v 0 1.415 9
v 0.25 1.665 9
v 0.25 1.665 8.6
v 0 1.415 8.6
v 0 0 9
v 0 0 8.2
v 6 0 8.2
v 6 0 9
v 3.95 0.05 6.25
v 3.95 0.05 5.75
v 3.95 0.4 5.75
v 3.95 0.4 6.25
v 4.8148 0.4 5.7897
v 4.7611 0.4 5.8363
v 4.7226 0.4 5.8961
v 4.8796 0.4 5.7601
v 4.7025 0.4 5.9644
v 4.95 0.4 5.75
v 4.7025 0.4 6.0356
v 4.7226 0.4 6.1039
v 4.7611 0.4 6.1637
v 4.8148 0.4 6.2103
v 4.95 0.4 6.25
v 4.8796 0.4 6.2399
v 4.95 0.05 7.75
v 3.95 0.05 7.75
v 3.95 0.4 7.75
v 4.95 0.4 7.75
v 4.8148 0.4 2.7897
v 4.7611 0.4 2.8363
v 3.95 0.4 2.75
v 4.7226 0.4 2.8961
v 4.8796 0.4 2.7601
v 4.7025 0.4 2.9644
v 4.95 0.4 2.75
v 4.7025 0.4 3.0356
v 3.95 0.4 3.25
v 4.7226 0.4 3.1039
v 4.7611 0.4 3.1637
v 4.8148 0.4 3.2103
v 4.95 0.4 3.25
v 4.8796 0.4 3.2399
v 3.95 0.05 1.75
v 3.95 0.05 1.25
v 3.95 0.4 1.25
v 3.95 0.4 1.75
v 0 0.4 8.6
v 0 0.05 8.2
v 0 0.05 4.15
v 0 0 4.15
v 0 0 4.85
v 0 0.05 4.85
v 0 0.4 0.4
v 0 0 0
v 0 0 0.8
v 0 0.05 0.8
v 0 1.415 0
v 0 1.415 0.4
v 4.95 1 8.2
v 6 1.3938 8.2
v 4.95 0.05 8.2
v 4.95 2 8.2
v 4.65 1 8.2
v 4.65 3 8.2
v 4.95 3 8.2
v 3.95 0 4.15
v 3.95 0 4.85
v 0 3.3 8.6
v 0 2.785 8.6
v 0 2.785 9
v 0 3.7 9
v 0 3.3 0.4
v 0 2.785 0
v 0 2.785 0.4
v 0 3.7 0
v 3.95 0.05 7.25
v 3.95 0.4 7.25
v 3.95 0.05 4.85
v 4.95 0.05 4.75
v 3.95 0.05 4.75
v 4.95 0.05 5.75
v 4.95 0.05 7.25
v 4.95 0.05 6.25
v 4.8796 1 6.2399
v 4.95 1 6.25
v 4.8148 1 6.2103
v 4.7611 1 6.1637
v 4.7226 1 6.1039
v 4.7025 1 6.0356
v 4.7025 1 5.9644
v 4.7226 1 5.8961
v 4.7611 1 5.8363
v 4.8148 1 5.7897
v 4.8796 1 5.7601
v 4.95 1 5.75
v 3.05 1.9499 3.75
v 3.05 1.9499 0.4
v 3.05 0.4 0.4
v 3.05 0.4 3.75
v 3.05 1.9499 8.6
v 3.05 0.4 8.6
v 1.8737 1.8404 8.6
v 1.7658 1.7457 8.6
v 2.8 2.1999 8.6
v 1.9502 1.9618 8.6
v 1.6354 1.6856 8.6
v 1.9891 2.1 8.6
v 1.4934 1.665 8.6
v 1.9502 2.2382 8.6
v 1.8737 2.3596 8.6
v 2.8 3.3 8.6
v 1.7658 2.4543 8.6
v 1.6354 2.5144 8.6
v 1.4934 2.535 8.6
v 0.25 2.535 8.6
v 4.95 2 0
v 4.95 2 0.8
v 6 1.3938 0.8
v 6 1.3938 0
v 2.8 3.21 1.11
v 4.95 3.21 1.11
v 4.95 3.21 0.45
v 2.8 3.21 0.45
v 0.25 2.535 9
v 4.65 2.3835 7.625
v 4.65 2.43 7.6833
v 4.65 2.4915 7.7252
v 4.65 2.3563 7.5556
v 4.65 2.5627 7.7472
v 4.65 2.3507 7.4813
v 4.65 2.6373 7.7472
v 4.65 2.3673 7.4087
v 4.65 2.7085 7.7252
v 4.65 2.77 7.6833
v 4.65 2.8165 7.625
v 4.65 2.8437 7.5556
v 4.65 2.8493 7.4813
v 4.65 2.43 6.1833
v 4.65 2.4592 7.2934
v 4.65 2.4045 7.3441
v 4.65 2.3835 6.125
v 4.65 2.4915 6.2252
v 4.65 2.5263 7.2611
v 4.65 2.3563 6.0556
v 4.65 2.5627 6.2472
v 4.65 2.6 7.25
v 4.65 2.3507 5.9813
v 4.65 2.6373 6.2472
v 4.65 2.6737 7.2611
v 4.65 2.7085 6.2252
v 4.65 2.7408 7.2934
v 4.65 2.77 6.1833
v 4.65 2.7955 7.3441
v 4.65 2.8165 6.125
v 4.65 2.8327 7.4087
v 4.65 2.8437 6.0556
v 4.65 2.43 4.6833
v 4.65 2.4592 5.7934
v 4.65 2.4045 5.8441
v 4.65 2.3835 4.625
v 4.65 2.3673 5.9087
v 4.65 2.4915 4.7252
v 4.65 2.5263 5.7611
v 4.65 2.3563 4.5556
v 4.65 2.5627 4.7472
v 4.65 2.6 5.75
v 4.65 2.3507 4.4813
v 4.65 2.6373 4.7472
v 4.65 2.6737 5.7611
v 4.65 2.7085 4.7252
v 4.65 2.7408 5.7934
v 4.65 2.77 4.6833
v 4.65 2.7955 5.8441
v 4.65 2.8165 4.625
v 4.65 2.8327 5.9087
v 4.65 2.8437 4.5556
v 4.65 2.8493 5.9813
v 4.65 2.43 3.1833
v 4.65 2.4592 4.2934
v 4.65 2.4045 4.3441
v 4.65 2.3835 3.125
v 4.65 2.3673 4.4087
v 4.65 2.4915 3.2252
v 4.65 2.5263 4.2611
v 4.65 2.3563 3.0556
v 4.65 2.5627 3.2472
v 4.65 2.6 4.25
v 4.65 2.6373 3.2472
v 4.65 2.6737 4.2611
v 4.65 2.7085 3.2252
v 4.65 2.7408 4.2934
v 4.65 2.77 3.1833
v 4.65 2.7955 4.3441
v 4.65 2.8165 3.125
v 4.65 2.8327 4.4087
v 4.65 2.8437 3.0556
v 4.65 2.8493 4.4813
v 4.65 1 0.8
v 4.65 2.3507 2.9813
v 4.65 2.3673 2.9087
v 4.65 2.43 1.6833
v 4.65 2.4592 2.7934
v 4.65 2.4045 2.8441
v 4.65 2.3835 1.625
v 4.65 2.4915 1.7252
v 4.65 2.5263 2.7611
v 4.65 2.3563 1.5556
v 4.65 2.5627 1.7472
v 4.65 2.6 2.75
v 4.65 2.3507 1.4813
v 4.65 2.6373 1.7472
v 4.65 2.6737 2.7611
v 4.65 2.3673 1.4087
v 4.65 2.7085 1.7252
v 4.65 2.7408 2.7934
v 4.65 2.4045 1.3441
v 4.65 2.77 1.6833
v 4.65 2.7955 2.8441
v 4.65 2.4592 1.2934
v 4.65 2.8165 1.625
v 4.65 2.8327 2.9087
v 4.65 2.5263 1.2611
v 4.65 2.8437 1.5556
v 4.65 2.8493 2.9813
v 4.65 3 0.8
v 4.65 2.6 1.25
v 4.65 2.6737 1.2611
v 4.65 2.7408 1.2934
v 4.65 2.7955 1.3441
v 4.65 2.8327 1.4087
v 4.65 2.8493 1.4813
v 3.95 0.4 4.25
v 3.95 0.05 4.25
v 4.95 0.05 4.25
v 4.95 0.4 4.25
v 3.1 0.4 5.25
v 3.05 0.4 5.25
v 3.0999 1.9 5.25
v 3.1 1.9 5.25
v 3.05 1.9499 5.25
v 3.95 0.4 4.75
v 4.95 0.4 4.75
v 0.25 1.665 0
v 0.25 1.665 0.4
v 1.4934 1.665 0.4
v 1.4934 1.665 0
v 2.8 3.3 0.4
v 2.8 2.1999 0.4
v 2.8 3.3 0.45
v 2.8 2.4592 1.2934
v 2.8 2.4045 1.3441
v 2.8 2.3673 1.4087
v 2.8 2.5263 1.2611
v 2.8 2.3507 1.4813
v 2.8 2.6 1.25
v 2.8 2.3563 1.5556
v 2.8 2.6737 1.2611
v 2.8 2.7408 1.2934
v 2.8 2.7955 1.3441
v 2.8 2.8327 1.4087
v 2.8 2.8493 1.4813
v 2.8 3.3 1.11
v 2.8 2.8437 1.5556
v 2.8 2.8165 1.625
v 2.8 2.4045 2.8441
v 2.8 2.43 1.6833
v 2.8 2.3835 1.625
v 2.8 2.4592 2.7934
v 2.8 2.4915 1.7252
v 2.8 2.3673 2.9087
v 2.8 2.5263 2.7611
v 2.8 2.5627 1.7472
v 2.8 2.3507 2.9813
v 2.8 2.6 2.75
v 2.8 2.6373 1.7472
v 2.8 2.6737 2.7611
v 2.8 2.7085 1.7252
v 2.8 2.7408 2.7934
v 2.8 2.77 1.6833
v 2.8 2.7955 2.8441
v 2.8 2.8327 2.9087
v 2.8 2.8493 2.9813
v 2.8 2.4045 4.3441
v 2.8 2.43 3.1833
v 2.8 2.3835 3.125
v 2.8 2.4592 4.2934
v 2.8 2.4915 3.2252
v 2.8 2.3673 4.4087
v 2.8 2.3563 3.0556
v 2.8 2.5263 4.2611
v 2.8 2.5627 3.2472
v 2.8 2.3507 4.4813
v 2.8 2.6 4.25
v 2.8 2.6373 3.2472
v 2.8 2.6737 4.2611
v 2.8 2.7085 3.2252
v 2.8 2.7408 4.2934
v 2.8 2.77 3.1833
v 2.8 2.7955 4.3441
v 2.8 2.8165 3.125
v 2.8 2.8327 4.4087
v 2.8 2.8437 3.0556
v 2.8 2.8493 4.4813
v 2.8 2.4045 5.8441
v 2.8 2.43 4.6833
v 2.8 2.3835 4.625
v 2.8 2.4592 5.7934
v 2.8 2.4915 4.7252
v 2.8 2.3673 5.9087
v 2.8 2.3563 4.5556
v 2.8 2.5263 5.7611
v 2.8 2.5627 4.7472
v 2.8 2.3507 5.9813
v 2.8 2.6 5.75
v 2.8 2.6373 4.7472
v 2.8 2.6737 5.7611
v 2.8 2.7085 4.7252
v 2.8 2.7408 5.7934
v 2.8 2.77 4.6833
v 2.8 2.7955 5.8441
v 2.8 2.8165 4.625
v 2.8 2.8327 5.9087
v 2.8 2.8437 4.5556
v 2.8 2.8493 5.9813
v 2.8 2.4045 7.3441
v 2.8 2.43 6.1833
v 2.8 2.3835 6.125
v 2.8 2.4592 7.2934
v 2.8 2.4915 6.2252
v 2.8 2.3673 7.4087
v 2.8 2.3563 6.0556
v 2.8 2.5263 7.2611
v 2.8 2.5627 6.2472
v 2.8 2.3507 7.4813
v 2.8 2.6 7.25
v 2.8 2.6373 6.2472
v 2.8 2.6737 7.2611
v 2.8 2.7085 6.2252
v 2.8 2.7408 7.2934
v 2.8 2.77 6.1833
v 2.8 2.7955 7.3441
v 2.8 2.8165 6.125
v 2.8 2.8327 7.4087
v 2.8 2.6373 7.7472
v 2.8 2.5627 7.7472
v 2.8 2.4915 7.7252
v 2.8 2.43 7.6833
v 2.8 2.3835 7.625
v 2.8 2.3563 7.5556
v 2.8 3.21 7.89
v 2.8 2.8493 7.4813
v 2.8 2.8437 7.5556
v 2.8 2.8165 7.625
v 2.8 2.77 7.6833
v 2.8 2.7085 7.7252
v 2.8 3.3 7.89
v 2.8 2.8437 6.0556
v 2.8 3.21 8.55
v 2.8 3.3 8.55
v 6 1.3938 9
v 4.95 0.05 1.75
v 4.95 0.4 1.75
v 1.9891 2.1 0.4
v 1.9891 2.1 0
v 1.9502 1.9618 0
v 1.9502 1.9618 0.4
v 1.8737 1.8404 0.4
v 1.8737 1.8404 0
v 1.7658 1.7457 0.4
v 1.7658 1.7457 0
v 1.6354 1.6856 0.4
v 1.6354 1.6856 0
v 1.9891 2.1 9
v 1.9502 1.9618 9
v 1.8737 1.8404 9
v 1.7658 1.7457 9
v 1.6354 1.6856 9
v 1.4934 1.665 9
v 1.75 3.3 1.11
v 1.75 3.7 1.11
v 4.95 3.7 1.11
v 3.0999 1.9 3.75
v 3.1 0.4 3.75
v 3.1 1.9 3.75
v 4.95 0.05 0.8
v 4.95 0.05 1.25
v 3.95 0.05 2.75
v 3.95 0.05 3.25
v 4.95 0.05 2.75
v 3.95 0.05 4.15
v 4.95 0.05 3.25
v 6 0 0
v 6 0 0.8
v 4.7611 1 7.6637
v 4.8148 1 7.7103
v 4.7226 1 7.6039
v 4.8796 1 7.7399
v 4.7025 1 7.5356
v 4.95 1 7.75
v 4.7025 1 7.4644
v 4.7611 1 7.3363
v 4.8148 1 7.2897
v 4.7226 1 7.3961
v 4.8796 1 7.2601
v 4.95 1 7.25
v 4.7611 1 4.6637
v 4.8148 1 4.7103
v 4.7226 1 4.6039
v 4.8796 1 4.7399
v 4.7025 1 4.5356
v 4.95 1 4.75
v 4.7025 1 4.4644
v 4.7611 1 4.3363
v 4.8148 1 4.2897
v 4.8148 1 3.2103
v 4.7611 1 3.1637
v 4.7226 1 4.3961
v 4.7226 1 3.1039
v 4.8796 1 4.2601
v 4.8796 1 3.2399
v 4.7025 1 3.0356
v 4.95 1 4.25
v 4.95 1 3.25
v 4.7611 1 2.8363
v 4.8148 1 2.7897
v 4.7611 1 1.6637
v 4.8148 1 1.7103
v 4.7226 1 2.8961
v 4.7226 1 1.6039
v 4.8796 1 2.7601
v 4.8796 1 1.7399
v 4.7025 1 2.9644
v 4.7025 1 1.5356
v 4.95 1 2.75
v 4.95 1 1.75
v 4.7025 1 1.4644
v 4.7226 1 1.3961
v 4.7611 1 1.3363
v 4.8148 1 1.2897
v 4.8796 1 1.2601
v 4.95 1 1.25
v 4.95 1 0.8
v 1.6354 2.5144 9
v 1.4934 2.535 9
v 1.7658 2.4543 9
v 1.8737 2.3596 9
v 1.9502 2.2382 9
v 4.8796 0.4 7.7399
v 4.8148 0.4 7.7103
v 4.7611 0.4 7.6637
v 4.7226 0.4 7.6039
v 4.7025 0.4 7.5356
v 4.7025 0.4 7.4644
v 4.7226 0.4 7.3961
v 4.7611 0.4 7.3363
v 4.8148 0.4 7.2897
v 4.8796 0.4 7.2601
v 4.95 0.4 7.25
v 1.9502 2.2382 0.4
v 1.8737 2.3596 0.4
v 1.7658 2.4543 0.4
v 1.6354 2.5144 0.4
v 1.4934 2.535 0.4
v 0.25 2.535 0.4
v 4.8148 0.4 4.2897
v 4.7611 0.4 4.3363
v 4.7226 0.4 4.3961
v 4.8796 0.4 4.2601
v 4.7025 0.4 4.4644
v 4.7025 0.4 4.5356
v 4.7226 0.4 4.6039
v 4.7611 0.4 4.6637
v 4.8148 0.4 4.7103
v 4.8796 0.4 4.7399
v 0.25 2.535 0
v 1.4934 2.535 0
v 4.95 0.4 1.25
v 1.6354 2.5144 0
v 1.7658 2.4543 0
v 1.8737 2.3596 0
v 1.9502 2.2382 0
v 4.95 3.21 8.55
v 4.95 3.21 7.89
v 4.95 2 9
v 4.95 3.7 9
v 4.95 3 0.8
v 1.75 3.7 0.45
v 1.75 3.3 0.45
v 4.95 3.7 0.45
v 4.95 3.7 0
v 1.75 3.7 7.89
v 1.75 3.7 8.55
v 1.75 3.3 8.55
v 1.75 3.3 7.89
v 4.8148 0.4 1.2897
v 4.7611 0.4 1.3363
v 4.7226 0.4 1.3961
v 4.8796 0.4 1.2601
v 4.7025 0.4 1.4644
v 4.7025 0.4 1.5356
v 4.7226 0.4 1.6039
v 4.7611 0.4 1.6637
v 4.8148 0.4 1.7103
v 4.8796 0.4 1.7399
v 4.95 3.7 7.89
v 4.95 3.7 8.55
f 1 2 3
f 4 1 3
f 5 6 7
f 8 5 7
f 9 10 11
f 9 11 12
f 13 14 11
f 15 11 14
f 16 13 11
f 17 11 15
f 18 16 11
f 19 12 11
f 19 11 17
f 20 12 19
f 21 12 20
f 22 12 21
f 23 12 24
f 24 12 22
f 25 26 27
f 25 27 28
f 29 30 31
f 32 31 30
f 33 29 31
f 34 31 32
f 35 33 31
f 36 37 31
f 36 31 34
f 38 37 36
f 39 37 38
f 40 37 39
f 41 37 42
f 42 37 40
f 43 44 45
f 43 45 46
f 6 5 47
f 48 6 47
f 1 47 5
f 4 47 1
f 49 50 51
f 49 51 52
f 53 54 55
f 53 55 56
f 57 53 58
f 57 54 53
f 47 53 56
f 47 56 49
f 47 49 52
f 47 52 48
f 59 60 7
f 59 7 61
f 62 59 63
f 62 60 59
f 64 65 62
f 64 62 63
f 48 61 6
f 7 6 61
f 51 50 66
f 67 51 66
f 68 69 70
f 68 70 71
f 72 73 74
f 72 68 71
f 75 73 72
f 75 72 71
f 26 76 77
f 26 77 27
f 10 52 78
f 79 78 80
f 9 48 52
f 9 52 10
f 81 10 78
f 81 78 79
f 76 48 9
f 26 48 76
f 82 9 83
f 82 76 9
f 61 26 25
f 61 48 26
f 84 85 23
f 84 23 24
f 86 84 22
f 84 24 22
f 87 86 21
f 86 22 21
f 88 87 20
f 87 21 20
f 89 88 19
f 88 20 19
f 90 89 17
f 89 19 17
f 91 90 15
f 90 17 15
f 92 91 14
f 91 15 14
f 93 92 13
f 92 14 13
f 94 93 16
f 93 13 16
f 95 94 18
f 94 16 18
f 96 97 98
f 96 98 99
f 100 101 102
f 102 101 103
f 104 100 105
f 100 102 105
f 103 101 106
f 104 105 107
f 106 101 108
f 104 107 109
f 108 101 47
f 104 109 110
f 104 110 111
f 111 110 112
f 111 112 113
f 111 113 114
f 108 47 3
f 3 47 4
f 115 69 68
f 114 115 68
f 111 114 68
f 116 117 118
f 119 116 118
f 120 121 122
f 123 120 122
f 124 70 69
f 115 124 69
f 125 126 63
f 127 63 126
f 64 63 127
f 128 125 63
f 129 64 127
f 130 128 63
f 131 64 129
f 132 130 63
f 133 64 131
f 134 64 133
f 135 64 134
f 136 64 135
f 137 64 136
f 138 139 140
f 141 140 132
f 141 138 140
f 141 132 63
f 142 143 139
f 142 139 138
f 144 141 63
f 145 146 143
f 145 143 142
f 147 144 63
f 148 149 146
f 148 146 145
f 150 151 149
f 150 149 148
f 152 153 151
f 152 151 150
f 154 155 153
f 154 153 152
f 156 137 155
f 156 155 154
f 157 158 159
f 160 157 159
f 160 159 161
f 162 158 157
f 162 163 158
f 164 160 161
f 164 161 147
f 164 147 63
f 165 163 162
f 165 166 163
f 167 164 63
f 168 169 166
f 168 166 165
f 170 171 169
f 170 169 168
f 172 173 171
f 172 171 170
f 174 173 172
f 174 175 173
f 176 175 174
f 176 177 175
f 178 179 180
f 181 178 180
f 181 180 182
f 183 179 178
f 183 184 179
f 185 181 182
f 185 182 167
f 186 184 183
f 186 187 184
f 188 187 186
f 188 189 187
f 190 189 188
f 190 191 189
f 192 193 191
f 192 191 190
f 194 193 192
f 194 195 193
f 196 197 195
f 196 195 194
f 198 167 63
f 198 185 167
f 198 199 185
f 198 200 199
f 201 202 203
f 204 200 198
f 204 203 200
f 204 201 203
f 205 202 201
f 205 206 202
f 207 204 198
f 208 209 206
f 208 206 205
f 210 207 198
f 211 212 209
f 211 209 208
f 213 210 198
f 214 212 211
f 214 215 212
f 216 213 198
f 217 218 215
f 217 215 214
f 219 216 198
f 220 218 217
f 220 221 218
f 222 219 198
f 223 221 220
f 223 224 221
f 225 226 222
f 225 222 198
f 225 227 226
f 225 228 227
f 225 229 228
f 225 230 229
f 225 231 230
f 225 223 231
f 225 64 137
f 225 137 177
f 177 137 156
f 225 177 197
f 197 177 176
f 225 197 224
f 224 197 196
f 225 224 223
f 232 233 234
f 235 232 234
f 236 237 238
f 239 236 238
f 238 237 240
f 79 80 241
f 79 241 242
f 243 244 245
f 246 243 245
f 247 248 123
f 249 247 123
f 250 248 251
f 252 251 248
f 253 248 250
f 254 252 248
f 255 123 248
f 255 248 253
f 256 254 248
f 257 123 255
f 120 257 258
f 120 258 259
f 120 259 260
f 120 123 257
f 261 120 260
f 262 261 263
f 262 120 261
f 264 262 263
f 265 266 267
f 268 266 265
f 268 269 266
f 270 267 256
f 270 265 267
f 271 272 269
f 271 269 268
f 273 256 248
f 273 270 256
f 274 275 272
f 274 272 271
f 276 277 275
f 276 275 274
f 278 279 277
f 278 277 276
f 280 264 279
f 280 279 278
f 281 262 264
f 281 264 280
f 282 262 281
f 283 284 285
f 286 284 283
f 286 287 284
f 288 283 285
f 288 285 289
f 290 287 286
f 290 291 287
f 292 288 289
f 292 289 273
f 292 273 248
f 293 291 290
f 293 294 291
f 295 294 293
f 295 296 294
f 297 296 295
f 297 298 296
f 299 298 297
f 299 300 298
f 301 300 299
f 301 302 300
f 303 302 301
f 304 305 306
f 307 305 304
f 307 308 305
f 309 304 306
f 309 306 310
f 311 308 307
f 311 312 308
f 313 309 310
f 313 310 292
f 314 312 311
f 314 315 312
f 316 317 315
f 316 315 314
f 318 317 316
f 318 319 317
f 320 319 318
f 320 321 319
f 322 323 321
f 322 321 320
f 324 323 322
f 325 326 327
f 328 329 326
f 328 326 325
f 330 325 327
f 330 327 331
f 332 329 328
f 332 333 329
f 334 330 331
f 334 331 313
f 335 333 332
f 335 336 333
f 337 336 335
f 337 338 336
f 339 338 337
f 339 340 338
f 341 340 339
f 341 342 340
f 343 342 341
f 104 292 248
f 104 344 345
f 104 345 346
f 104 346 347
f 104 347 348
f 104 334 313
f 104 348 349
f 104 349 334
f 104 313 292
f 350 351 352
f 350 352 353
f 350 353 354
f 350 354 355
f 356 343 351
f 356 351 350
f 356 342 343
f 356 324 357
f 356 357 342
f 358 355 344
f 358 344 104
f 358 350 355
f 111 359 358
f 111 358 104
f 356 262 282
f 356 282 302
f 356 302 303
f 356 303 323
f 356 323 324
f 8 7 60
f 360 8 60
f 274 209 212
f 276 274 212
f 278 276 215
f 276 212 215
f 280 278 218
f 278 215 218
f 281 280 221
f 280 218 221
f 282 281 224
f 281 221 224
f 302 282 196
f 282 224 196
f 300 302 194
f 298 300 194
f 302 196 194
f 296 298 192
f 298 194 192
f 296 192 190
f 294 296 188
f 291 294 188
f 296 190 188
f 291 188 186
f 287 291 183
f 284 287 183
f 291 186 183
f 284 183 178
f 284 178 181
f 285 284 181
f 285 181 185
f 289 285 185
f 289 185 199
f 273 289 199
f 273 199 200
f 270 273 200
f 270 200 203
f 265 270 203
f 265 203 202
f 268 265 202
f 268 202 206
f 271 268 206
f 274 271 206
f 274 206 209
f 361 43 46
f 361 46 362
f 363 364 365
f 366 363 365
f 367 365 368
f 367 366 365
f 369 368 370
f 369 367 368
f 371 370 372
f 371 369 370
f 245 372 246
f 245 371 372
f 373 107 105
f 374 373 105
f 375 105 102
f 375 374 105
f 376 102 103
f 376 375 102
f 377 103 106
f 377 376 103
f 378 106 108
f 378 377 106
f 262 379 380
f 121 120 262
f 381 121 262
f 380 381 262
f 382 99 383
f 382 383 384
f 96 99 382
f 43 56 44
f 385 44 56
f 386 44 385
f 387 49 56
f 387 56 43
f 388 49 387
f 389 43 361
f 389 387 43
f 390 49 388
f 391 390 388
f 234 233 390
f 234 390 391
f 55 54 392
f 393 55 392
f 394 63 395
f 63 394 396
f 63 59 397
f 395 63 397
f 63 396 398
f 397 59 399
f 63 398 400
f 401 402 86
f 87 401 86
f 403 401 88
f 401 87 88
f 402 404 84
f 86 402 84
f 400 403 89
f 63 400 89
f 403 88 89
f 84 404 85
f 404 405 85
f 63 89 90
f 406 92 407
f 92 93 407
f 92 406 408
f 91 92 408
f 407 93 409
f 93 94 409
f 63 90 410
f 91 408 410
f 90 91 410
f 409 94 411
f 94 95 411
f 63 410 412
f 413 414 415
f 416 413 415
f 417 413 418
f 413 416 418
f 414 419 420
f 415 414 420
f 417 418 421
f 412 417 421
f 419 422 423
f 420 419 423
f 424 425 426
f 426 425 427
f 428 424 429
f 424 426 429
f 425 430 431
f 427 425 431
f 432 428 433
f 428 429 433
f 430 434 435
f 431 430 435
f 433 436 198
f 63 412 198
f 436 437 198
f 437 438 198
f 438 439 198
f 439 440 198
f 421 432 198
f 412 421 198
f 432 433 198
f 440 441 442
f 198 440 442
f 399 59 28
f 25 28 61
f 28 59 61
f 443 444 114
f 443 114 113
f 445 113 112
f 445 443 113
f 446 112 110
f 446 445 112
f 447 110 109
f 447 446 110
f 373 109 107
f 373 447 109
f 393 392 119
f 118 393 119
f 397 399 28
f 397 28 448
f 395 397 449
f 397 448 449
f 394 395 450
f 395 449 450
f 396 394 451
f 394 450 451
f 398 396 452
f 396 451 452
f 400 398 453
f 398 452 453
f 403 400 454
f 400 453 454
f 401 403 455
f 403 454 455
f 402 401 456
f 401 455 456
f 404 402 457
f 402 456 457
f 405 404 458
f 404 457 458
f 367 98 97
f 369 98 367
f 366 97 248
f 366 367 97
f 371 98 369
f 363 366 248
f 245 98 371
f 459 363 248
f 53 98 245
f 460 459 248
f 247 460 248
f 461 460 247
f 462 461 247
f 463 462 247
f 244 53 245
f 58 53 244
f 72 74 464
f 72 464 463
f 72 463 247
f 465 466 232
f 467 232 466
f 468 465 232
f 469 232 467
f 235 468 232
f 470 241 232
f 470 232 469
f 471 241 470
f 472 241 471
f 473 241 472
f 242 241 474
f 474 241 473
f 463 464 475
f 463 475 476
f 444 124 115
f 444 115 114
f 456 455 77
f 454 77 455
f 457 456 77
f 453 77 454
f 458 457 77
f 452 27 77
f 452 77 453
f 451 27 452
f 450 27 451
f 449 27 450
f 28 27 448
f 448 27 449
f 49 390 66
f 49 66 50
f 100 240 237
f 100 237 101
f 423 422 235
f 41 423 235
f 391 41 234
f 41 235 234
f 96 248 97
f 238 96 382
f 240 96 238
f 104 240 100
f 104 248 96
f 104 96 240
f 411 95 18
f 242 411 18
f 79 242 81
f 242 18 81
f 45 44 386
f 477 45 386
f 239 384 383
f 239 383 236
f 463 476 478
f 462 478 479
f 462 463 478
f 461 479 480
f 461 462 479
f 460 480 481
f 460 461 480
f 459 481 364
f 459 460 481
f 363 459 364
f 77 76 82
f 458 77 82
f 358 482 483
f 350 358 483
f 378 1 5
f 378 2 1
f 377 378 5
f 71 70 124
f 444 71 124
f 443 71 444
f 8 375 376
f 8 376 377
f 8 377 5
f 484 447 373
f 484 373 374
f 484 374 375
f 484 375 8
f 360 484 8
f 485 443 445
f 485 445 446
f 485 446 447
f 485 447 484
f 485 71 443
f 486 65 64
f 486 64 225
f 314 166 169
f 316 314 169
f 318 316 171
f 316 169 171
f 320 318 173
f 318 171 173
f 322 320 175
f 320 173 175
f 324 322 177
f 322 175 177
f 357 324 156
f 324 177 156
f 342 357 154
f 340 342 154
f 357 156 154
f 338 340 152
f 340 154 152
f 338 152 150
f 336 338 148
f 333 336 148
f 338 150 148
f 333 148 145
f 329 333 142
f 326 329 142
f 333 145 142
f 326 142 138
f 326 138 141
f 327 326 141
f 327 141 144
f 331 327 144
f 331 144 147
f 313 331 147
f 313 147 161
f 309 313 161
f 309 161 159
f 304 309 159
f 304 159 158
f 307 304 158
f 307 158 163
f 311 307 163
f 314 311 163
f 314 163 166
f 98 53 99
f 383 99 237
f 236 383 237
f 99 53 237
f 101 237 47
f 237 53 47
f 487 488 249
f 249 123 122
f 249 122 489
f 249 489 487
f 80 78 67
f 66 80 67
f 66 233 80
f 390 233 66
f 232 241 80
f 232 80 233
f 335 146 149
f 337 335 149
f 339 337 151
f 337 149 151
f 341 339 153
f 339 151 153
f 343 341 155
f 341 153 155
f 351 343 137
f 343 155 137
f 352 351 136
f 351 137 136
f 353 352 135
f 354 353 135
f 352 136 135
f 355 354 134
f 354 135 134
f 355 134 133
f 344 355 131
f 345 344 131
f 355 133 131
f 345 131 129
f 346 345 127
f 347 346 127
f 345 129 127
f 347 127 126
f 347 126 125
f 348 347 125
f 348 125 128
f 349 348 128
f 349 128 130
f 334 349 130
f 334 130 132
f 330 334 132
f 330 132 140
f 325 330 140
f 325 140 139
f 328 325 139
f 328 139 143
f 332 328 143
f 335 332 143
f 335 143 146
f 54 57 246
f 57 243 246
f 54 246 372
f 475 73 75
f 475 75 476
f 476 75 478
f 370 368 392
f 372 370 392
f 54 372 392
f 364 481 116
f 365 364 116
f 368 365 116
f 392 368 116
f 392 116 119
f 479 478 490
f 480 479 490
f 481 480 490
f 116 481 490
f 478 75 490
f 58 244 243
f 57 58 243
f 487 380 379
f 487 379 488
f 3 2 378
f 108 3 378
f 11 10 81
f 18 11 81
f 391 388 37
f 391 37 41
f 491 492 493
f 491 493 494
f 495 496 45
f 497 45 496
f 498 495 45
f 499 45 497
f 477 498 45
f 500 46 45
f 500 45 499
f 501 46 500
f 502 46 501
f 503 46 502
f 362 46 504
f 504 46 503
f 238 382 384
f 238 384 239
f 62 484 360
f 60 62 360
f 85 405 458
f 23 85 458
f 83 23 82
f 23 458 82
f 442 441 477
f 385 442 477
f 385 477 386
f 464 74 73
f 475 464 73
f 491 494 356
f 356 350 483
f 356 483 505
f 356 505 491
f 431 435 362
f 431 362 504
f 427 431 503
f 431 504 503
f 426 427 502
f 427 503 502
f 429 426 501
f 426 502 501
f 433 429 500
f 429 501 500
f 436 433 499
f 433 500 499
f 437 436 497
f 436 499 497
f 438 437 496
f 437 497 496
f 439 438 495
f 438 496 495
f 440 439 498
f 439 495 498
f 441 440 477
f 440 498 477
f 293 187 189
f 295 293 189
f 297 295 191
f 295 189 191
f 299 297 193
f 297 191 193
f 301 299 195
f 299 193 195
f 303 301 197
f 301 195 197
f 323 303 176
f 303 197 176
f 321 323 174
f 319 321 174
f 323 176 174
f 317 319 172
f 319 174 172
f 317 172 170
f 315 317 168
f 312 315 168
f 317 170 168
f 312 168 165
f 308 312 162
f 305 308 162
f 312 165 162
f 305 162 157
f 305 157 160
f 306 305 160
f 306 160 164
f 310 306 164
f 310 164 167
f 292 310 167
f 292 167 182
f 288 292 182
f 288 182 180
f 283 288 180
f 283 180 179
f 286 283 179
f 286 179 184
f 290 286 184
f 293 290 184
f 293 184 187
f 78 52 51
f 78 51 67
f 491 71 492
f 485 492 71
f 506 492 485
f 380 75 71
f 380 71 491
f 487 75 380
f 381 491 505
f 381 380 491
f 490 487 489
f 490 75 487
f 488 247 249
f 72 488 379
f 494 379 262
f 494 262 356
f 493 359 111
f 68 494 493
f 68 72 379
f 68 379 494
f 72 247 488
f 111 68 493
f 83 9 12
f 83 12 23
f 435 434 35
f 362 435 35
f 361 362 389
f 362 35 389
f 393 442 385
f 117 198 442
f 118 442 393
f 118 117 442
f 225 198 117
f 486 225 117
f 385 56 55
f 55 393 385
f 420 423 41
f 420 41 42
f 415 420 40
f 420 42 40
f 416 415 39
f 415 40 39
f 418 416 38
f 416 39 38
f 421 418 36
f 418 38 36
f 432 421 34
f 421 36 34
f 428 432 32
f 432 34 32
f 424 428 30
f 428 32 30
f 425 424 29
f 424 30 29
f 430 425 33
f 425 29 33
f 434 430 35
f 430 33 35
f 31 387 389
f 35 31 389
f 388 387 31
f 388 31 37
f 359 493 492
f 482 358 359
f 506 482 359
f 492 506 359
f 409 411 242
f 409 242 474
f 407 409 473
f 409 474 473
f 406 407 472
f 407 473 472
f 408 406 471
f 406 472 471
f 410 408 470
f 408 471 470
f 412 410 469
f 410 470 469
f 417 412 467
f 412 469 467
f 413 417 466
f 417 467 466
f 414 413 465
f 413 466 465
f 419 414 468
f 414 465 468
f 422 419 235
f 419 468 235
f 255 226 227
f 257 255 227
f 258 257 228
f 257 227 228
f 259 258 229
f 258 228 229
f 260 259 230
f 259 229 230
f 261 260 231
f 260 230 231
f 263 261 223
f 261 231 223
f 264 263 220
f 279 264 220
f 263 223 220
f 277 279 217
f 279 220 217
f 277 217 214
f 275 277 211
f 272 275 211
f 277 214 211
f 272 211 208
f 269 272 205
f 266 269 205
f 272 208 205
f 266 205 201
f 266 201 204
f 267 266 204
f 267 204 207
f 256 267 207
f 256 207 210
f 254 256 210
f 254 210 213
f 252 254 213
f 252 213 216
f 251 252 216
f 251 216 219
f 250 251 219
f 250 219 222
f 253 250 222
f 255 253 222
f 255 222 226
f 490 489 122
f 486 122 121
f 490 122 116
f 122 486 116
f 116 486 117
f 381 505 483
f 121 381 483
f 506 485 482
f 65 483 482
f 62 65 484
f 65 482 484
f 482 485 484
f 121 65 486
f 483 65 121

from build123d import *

# Parameters (mm, degrees)
SKETCH_1_W               = 6
SKETCH_1_H               = 3.7
EXTRUDE_1_DEPTH          = 9
SKETCH_2_W               = 1.993366308
SKETCH_2_H               = 0.87
CUT_EXTRUDE_1_DEPTH      = 12.431972708
CHAMFER_1_SIZE           = 0.25
FILLET_1_R               = 0.5
SKETCH_3_W               = 8.2
SKETCH_3_H               = 2.9
CUT_EXTRUDE_2_DEPTH      = 2.8
SKETCH_4_W               = 7.4
SKETCH_4_H               = 3
CUT_EXTRUDE_3_DEPTH      = 1.05
SKETCH_5_W               = 7.4
SKETCH_5_H               = 2
CUT_EXTRUDE_4_DEPTH      = 0.3
SKETCH_6_R               = 0.25
CUT_EXTRUDE_5_DEPTH      = 1
SKETCH_7_R               = 0.25
CUT_EXTRUDE_6_DEPTH      = 11.784827305
SKETCH_8_W               = 1
SKETCH_8_H               = 0.5
CUT_EXTRUDE_7_DEPTH      = 0.4
CUT_EXTRUDE_8_DEPTH      = 12.431972708
CUT_EXTRUDE_8_DEPTH_BACK = 0.05
SKETCH_10_W              = 0.66
SKETCH_10_H              = 0.49
CUT_EXTRUDE_9_DEPTH      = 3.2
SKETCH_11_W              = 8.2
SKETCH_11_H              = 1.5
CUT_EXTRUDE_10_DEPTH     = 0.25
SKETCH_12_W              = 1.5
SKETCH_12_H              = 1.5
CUT_EXTRUDE_11_DEPTH     = 0.05
CHAMFER_2_SIZE           = 0.3


# Some blends are built 0.0001 mm under size
with BuildPart() as part:
    # 스케치1 → 보스-돌출1 (new body)
    with BuildSketch(Plane.XY):
        with Locations((3, 1.85)):
            Rectangle(SKETCH_1_W, SKETCH_1_H)
    extrude(amount=EXTRUDE_1_DEPTH)

    # 스케치2 → 컷-돌출1 (cut, through all)
    with BuildSketch(Plane.XY.offset(9)):
        Polygon((6, 3.7), (4.95, 3.7), (4.95, 2), (6, 1.393782217), align=None)
        with Locations((0.996683154, 2.1)):
            Rectangle(SKETCH_2_W, SKETCH_2_H)
    extrude(amount=-CUT_EXTRUDE_1_DEPTH, mode=Mode.SUBTRACT)

    # 모따기1
    chamfer_1_edges = [part.edges().sort_by_distance(p)[0] for p in [
        (0, 1.665, 4.5),
        (0, 2.535, 4.5),
    ]]
    chamfer(chamfer_1_edges, length=CHAMFER_1_SIZE)

    # 필렛1
    # the kernel refuses this fillet: 0.5 mm, written as the material it adds along each edge
    with BuildSketch(Plane(origin=(1.993366308, 1.665, 9), x_dir=(-1, 0, 0), z_dir=(0, 0, -1)), Plane(origin=(1.993366308, 2.535, 9), x_dir=(0, -1, 0), z_dir=(0, 0, -1))) as fillet_1_piece_1:
        with BuildLine():
            CenterArc((FILLET_1_R, FILLET_1_R), FILLET_1_R, 180, 90)
            Line((0, FILLET_1_R), (0, 0))
            Line((0, 0), (FILLET_1_R, 0))
        make_face()
    extrude(amount=9)

    # 스케치3 → 컷-돌출2 (cut)
    with BuildSketch(Plane.ZY):
        with Locations((4.5, 1.85)):
            Rectangle(SKETCH_3_W, SKETCH_3_H)
    extrude(amount=-CUT_EXTRUDE_2_DEPTH, mode=Mode.SUBTRACT)

    # 스케치4 → 컷-돌출3 (cut)
    with BuildSketch(Plane(origin=(6, 0, 0), x_dir=(0, 0, -1), z_dir=(1, 0, 0))):
        with Locations((-4.5, 1.5)):
            Rectangle(SKETCH_4_W, SKETCH_4_H)
    extrude(amount=-CUT_EXTRUDE_3_DEPTH, mode=Mode.SUBTRACT)

    # 스케치5 → 컷-돌출4 (cut)
    with BuildSketch(Plane(origin=(4.95, 0, 0), x_dir=(0, 0, -1), z_dir=(1, 0, 0))):
        with Locations((-4.5, 2)):
            Rectangle(SKETCH_5_W, SKETCH_5_H)
    extrude(amount=-CUT_EXTRUDE_4_DEPTH, mode=Mode.SUBTRACT)

    # 스케치6 → 컷-돌출5 (cut)
    with BuildSketch(Plane.XZ):
        with Locations((4.95, 4.5)):
            Circle(SKETCH_6_R)
        with Locations((4.95, 6)):
            Circle(SKETCH_6_R)
        with Locations((4.95, 3)):
            Circle(SKETCH_6_R)
        with Locations((4.95, 7.5)):
            Circle(SKETCH_6_R)
        with Locations((4.95, 1.5)):
            Circle(SKETCH_6_R)
    extrude(amount=-CUT_EXTRUDE_5_DEPTH, mode=Mode.SUBTRACT)

    # 스케치7 → 컷-돌출6 (cut, through all)
    with BuildSketch(Plane(origin=(4.65, 0, 0), x_dir=(0, 0, -1), z_dir=(1, 0, 0))):
        with Locations((-7.5, 2.6)):
            Circle(SKETCH_7_R)
        with Locations((-6, 2.6)):
            Circle(SKETCH_7_R)
        with Locations((-4.5, 2.6)):
            Circle(SKETCH_7_R)
        with Locations((-3, 2.6)):
            Circle(SKETCH_7_R)
        with Locations((-1.5, 2.6)):
            Circle(SKETCH_7_R)
    extrude(amount=-CUT_EXTRUDE_6_DEPTH, mode=Mode.SUBTRACT)

    # 스케치8 → 컷-돌출7 (cut)
    with BuildSketch(Plane.XZ):
        with Locations((4.45, 7.5)):
            Rectangle(SKETCH_8_W, SKETCH_8_H)
        with Locations((4.45, 6)):
            Rectangle(SKETCH_8_W, SKETCH_8_H)
        with Locations((4.45, 4.5)):
            Rectangle(SKETCH_8_W, SKETCH_8_H)
        with Locations((4.45, 3)):
            Rectangle(SKETCH_8_W, SKETCH_8_H)
        with Locations((4.45, 1.5)):
            Rectangle(SKETCH_8_W, SKETCH_8_H)
    extrude(amount=-CUT_EXTRUDE_7_DEPTH, mode=Mode.SUBTRACT)

    # 스케치9 → 컷-돌출8 (cut, two sides: drawn at the far end of the back side and taken through both)
    with BuildSketch(Plane.XZ.offset(-CUT_EXTRUDE_8_DEPTH_BACK)):
        Polygon((4.95, 8.2), (0, 8.2), (0, 4.85), (3.95, 4.85), (3.95, 4.75), (4.95, 4.75), (4.95, 5.75), (3.95, 5.75), (3.95, 6.25), (4.95, 6.25), (4.95, 7.25), (3.95, 7.25), (3.95, 7.75), (4.95, 7.75), align=None)
        Polygon((3.95, 4.15), (0, 4.15), (0, 0.8), (4.95, 0.8), (4.95, 1.25), (3.95, 1.25), (3.95, 1.75), (4.95, 1.75), (4.95, 2.75), (3.95, 2.75), (3.95, 3.25), (4.95, 3.25), (4.95, 4.25), (3.95, 4.25), align=None)
    extrude(amount=CUT_EXTRUDE_8_DEPTH + CUT_EXTRUDE_8_DEPTH_BACK, mode=Mode.SUBTRACT)

    # 스케치10 → 컷-돌출9 (cut)
    with BuildSketch(Plane(origin=(4.95, 0, 0), x_dir=(0, 0, -1), z_dir=(1, 0, 0))):
        with Locations((-8.22, 3.455)):
            Rectangle(SKETCH_10_W, SKETCH_10_H)
        with Locations((-0.78, 3.455)):
            Rectangle(SKETCH_10_W, SKETCH_10_H)
    extrude(amount=-CUT_EXTRUDE_9_DEPTH, mode=Mode.SUBTRACT)

    # 스케치11 → 컷-돌출10 (cut)
    with BuildSketch(Plane.ZY.offset(-2.8)):
        with Locations((4.5, 1.15)):
            Rectangle(SKETCH_11_W, SKETCH_11_H)
    extrude(amount=-CUT_EXTRUDE_10_DEPTH, mode=Mode.SUBTRACT)

    # 스케치12 → 컷-돌출11 (cut)
    with BuildSketch(Plane.ZY.offset(-3.05)):
        with Locations((4.5, 1.15)):
            Rectangle(SKETCH_12_W, SKETCH_12_H)
    extrude(amount=-CUT_EXTRUDE_11_DEPTH, mode=Mode.SUBTRACT)

    # 모따기2
    chamfer_2_edges = [part.edges().sort_by_distance(p)[0] for p in [
        (2.8, 1.9, 4.5),
    ]]
    chamfer(chamfer_2_edges, length=CHAMFER_2_SIZE - 0.0001)  # a hair under: the kernel refuses the full size


solid = part.part
